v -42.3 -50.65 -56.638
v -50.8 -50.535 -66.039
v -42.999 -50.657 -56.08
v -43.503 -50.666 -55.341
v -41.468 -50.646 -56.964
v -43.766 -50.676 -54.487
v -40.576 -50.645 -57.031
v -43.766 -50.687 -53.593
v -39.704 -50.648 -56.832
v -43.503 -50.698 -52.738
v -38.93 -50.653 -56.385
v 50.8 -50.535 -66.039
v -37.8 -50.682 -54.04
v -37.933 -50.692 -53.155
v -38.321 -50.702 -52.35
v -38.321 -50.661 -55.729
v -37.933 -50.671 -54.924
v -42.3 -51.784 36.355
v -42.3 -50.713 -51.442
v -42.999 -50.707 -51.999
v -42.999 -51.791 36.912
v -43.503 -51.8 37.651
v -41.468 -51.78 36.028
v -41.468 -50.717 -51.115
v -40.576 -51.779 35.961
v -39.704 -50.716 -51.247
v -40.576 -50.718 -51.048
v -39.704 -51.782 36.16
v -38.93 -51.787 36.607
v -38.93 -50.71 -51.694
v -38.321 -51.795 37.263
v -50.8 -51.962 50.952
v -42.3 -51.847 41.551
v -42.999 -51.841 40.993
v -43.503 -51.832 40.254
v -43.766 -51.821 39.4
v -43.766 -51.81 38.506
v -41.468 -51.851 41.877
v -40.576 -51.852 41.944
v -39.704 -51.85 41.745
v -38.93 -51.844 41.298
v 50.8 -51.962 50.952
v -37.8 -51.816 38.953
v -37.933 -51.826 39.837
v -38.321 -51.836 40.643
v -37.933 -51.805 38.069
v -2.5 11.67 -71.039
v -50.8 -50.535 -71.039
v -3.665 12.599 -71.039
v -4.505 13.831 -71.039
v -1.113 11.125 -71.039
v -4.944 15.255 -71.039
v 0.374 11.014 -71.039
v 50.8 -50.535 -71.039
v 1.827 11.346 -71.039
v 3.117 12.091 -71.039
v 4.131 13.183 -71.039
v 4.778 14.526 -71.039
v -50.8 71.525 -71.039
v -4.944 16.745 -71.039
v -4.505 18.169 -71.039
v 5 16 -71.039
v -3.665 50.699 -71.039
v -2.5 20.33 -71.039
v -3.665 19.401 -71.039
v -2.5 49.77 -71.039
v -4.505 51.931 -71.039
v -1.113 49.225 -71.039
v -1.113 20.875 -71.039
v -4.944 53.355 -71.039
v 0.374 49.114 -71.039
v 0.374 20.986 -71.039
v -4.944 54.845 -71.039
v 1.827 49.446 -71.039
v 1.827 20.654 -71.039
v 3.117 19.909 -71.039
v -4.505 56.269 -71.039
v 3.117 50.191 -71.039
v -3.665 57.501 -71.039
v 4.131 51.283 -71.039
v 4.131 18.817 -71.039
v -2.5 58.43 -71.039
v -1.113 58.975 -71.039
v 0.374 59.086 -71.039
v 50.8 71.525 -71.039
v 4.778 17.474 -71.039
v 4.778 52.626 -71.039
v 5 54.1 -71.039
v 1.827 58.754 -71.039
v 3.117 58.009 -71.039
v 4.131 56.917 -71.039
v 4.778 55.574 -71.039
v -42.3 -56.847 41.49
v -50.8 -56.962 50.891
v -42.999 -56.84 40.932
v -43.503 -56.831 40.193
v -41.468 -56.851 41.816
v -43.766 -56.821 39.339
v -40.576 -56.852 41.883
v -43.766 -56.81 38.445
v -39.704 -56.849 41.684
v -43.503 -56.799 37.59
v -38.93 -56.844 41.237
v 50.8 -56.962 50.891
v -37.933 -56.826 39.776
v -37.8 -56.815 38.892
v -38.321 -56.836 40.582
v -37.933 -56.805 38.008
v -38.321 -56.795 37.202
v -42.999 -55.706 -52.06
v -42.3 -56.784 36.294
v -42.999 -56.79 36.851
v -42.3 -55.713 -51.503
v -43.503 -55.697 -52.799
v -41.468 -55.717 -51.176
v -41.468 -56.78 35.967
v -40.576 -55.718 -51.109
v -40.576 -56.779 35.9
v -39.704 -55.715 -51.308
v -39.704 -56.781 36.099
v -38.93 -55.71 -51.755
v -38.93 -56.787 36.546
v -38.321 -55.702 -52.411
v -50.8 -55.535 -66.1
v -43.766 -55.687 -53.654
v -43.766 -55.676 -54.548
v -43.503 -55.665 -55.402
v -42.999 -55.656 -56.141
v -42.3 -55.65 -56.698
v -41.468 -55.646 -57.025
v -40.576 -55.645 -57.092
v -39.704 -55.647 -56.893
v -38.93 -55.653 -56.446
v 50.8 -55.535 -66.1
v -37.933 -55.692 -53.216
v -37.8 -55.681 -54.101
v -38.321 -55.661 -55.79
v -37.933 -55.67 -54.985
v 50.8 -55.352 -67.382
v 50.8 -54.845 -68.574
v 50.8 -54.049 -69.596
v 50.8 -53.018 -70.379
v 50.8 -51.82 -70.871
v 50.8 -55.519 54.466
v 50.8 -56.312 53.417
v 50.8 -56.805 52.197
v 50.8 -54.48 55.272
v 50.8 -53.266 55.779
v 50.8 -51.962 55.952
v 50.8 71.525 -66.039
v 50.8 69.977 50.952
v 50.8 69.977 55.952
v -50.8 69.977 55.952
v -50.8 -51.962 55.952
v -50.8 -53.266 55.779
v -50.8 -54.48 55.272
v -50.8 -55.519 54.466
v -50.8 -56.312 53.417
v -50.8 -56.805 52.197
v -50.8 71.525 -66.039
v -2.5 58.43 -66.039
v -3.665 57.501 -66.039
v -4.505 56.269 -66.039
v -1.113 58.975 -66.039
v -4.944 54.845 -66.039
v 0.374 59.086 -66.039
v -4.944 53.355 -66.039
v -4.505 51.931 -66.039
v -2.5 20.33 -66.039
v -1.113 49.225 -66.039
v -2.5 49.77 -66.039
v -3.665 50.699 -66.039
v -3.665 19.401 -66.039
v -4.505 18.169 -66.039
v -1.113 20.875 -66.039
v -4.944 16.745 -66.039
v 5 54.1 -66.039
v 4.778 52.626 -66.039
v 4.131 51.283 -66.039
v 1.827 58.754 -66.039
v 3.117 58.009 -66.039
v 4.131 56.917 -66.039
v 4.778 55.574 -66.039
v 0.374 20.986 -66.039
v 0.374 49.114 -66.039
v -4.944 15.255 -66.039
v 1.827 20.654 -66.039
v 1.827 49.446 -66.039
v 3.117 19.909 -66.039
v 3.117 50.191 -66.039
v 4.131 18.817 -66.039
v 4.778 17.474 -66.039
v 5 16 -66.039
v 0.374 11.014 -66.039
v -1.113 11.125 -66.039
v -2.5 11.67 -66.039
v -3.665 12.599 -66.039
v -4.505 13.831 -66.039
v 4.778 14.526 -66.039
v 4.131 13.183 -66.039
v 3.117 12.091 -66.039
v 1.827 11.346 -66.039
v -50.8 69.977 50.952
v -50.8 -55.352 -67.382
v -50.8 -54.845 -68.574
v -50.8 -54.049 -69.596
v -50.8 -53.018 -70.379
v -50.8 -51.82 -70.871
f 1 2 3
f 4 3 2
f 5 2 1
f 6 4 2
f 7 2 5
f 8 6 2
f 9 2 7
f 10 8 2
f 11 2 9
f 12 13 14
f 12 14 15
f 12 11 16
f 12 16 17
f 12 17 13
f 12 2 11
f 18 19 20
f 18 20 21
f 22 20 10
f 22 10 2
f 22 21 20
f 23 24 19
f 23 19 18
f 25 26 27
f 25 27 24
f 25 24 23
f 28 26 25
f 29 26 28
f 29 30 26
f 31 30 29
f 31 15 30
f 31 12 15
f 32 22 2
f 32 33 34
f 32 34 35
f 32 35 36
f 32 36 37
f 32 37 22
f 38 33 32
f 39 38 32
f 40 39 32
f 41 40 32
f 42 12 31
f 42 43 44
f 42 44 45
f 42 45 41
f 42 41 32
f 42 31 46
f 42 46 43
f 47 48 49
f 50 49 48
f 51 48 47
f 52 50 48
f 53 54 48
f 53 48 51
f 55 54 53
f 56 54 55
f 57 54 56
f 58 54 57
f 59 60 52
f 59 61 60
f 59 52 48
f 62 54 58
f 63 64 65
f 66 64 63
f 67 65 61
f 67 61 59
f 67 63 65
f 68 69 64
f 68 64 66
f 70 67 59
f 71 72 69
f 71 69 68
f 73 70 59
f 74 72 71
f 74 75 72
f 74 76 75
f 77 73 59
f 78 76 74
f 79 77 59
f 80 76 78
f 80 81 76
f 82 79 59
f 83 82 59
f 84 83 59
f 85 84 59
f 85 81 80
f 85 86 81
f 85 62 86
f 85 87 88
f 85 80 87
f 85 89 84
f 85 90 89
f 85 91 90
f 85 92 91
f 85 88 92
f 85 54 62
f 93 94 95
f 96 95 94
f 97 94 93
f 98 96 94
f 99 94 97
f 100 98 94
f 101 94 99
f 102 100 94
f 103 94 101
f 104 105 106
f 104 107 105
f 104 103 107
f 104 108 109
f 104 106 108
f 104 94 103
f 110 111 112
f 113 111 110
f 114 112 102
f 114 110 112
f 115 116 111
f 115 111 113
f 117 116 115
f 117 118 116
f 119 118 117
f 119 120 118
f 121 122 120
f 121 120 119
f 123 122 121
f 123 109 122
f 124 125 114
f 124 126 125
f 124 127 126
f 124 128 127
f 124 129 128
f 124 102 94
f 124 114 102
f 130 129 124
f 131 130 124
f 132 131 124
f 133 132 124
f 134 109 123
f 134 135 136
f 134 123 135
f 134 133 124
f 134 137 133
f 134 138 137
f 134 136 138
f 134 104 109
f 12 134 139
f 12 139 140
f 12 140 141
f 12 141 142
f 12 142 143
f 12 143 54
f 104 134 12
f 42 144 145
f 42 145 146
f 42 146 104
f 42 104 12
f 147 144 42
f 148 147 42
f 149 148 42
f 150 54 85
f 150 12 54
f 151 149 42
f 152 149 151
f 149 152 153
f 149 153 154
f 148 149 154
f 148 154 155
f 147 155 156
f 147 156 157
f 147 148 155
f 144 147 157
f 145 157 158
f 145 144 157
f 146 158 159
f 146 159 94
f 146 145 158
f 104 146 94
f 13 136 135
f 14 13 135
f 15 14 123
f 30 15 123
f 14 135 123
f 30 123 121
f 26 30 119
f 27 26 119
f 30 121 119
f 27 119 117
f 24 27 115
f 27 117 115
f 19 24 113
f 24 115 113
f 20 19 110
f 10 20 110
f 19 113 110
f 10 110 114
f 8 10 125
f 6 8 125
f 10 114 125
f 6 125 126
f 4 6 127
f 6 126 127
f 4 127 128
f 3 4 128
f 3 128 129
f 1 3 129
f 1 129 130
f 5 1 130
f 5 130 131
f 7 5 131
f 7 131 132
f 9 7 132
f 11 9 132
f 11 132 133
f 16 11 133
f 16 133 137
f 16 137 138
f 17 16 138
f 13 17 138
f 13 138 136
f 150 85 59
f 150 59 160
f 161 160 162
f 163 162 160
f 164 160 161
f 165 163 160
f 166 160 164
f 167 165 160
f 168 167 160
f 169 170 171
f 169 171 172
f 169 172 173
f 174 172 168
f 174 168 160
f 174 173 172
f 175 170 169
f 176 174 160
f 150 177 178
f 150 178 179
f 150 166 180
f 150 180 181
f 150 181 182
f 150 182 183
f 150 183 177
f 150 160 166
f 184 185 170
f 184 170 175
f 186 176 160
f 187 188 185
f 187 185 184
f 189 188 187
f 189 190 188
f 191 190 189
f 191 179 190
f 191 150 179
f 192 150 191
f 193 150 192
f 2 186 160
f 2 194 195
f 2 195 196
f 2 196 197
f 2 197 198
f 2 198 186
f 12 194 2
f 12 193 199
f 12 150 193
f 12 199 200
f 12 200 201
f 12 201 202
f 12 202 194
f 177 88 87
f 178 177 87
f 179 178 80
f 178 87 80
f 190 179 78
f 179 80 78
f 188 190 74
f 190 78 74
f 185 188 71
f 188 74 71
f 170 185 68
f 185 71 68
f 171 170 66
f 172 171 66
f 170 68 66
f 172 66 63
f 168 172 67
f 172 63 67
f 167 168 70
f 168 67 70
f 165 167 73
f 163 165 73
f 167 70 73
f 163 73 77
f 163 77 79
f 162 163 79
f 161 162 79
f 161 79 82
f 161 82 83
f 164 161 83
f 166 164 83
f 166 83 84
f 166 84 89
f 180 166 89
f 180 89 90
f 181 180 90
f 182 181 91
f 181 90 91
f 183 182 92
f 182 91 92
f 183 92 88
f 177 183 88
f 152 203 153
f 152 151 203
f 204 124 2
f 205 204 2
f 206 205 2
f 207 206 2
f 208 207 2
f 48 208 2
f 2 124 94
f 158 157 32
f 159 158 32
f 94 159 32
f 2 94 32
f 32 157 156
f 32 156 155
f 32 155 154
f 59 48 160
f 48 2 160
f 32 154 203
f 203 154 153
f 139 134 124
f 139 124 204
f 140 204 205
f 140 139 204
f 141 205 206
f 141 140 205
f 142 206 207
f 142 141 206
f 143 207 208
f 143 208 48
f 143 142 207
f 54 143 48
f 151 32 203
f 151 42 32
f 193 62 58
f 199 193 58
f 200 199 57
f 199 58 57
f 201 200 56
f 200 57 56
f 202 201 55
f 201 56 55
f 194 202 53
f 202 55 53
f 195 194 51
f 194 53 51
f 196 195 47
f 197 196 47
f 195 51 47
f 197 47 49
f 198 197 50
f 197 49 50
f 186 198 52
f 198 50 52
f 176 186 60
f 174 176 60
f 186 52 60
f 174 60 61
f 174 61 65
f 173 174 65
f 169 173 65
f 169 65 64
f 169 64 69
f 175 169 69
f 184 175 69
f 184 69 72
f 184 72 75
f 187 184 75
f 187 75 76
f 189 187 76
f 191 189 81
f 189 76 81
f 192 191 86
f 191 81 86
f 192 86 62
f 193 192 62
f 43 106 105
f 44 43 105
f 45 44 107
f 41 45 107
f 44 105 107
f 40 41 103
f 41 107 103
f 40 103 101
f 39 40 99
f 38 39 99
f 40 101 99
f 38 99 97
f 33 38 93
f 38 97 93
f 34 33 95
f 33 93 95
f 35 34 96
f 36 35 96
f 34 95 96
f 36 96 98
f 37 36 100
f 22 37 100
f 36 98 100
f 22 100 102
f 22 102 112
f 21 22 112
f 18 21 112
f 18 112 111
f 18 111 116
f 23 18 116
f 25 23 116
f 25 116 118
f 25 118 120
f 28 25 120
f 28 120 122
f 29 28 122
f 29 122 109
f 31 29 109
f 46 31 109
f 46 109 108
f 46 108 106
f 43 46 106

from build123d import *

# Parameters (mm, degrees)
F1_DEPTH = 50.8
F2_R     = 5
F3_DEPTH = 4.9999996097
F4_R     = 3
F5_DEPTH = 128.5401096596


with BuildPart() as f1:
    # F0 (on Right) → F1 (new body, symmetric)
    with BuildSketch(Plane.YZ):
        with BuildLine():
            Line((69.9766400008, 50.951808691), (69.9766400008, 55.9518083008))
            Line((69.9766400008, 55.9518083008), (-51.9620125118, 55.9518083008))
            ThreePointArc((-51.9620125118, 55.9518083008), (-55.5190376607, 54.4657195247), (-56.9616407497, 50.8908371368))
            Line((-56.9616407497, 50.8908371368), (-55.5349245808, -66.0997201058))
            ThreePointArc((-55.5349245808, -66.0997201058), (-54.0492075669, -69.5957740907), (-50.5352963429, -71.0387489418))
            Line((-50.5352963429, -71.0387489418), (71.525307565, -71.0387489418))
            Line((71.525307565, -71.0387489418), (71.525307565, -66.0387493321))
            Line((71.525307565, -66.0387493321), (-50.5352967284, -66.0387493321))
            Line((-50.5352967284, -66.0387493321), (-51.9620129069, 50.951808691))
            Line((-51.9620129069, 50.951808691), (69.9766400008, 50.951808691))
        make_face()
    extrude(amount=F1_DEPTH, both=True)

    # F2 (on face) → F3 (cut, through all)
    with BuildSketch(Plane(origin=(0, 0, -71.0387489418), x_dir=(1, 0, 0), z_dir=(0, 0, -1))):
        with Locations((0, -16)):
            Circle(F2_R)
        with Locations((0, -54.1)):
            Circle(F2_R)
    extrude(amount=-F3_DEPTH, mode=Mode.SUBTRACT)

    # F4 (on face) → F5 (cut, through all)
    with BuildSketch(Plane(origin=(0, -56.3326420192, -0.6869844294), x_dir=(1, 0, 0), z_dir=(0, -0.9999256476, -0.0121942328))):
        with Locations((-40.8, 39.5816567872)):
            Circle(F4_R)
        with Locations((-40.8, -53.4175996333)):
            Circle(F4_R)
    extrude(amount=-F5_DEPTH, mode=Mode.SUBTRACT)


solid = f1.part
